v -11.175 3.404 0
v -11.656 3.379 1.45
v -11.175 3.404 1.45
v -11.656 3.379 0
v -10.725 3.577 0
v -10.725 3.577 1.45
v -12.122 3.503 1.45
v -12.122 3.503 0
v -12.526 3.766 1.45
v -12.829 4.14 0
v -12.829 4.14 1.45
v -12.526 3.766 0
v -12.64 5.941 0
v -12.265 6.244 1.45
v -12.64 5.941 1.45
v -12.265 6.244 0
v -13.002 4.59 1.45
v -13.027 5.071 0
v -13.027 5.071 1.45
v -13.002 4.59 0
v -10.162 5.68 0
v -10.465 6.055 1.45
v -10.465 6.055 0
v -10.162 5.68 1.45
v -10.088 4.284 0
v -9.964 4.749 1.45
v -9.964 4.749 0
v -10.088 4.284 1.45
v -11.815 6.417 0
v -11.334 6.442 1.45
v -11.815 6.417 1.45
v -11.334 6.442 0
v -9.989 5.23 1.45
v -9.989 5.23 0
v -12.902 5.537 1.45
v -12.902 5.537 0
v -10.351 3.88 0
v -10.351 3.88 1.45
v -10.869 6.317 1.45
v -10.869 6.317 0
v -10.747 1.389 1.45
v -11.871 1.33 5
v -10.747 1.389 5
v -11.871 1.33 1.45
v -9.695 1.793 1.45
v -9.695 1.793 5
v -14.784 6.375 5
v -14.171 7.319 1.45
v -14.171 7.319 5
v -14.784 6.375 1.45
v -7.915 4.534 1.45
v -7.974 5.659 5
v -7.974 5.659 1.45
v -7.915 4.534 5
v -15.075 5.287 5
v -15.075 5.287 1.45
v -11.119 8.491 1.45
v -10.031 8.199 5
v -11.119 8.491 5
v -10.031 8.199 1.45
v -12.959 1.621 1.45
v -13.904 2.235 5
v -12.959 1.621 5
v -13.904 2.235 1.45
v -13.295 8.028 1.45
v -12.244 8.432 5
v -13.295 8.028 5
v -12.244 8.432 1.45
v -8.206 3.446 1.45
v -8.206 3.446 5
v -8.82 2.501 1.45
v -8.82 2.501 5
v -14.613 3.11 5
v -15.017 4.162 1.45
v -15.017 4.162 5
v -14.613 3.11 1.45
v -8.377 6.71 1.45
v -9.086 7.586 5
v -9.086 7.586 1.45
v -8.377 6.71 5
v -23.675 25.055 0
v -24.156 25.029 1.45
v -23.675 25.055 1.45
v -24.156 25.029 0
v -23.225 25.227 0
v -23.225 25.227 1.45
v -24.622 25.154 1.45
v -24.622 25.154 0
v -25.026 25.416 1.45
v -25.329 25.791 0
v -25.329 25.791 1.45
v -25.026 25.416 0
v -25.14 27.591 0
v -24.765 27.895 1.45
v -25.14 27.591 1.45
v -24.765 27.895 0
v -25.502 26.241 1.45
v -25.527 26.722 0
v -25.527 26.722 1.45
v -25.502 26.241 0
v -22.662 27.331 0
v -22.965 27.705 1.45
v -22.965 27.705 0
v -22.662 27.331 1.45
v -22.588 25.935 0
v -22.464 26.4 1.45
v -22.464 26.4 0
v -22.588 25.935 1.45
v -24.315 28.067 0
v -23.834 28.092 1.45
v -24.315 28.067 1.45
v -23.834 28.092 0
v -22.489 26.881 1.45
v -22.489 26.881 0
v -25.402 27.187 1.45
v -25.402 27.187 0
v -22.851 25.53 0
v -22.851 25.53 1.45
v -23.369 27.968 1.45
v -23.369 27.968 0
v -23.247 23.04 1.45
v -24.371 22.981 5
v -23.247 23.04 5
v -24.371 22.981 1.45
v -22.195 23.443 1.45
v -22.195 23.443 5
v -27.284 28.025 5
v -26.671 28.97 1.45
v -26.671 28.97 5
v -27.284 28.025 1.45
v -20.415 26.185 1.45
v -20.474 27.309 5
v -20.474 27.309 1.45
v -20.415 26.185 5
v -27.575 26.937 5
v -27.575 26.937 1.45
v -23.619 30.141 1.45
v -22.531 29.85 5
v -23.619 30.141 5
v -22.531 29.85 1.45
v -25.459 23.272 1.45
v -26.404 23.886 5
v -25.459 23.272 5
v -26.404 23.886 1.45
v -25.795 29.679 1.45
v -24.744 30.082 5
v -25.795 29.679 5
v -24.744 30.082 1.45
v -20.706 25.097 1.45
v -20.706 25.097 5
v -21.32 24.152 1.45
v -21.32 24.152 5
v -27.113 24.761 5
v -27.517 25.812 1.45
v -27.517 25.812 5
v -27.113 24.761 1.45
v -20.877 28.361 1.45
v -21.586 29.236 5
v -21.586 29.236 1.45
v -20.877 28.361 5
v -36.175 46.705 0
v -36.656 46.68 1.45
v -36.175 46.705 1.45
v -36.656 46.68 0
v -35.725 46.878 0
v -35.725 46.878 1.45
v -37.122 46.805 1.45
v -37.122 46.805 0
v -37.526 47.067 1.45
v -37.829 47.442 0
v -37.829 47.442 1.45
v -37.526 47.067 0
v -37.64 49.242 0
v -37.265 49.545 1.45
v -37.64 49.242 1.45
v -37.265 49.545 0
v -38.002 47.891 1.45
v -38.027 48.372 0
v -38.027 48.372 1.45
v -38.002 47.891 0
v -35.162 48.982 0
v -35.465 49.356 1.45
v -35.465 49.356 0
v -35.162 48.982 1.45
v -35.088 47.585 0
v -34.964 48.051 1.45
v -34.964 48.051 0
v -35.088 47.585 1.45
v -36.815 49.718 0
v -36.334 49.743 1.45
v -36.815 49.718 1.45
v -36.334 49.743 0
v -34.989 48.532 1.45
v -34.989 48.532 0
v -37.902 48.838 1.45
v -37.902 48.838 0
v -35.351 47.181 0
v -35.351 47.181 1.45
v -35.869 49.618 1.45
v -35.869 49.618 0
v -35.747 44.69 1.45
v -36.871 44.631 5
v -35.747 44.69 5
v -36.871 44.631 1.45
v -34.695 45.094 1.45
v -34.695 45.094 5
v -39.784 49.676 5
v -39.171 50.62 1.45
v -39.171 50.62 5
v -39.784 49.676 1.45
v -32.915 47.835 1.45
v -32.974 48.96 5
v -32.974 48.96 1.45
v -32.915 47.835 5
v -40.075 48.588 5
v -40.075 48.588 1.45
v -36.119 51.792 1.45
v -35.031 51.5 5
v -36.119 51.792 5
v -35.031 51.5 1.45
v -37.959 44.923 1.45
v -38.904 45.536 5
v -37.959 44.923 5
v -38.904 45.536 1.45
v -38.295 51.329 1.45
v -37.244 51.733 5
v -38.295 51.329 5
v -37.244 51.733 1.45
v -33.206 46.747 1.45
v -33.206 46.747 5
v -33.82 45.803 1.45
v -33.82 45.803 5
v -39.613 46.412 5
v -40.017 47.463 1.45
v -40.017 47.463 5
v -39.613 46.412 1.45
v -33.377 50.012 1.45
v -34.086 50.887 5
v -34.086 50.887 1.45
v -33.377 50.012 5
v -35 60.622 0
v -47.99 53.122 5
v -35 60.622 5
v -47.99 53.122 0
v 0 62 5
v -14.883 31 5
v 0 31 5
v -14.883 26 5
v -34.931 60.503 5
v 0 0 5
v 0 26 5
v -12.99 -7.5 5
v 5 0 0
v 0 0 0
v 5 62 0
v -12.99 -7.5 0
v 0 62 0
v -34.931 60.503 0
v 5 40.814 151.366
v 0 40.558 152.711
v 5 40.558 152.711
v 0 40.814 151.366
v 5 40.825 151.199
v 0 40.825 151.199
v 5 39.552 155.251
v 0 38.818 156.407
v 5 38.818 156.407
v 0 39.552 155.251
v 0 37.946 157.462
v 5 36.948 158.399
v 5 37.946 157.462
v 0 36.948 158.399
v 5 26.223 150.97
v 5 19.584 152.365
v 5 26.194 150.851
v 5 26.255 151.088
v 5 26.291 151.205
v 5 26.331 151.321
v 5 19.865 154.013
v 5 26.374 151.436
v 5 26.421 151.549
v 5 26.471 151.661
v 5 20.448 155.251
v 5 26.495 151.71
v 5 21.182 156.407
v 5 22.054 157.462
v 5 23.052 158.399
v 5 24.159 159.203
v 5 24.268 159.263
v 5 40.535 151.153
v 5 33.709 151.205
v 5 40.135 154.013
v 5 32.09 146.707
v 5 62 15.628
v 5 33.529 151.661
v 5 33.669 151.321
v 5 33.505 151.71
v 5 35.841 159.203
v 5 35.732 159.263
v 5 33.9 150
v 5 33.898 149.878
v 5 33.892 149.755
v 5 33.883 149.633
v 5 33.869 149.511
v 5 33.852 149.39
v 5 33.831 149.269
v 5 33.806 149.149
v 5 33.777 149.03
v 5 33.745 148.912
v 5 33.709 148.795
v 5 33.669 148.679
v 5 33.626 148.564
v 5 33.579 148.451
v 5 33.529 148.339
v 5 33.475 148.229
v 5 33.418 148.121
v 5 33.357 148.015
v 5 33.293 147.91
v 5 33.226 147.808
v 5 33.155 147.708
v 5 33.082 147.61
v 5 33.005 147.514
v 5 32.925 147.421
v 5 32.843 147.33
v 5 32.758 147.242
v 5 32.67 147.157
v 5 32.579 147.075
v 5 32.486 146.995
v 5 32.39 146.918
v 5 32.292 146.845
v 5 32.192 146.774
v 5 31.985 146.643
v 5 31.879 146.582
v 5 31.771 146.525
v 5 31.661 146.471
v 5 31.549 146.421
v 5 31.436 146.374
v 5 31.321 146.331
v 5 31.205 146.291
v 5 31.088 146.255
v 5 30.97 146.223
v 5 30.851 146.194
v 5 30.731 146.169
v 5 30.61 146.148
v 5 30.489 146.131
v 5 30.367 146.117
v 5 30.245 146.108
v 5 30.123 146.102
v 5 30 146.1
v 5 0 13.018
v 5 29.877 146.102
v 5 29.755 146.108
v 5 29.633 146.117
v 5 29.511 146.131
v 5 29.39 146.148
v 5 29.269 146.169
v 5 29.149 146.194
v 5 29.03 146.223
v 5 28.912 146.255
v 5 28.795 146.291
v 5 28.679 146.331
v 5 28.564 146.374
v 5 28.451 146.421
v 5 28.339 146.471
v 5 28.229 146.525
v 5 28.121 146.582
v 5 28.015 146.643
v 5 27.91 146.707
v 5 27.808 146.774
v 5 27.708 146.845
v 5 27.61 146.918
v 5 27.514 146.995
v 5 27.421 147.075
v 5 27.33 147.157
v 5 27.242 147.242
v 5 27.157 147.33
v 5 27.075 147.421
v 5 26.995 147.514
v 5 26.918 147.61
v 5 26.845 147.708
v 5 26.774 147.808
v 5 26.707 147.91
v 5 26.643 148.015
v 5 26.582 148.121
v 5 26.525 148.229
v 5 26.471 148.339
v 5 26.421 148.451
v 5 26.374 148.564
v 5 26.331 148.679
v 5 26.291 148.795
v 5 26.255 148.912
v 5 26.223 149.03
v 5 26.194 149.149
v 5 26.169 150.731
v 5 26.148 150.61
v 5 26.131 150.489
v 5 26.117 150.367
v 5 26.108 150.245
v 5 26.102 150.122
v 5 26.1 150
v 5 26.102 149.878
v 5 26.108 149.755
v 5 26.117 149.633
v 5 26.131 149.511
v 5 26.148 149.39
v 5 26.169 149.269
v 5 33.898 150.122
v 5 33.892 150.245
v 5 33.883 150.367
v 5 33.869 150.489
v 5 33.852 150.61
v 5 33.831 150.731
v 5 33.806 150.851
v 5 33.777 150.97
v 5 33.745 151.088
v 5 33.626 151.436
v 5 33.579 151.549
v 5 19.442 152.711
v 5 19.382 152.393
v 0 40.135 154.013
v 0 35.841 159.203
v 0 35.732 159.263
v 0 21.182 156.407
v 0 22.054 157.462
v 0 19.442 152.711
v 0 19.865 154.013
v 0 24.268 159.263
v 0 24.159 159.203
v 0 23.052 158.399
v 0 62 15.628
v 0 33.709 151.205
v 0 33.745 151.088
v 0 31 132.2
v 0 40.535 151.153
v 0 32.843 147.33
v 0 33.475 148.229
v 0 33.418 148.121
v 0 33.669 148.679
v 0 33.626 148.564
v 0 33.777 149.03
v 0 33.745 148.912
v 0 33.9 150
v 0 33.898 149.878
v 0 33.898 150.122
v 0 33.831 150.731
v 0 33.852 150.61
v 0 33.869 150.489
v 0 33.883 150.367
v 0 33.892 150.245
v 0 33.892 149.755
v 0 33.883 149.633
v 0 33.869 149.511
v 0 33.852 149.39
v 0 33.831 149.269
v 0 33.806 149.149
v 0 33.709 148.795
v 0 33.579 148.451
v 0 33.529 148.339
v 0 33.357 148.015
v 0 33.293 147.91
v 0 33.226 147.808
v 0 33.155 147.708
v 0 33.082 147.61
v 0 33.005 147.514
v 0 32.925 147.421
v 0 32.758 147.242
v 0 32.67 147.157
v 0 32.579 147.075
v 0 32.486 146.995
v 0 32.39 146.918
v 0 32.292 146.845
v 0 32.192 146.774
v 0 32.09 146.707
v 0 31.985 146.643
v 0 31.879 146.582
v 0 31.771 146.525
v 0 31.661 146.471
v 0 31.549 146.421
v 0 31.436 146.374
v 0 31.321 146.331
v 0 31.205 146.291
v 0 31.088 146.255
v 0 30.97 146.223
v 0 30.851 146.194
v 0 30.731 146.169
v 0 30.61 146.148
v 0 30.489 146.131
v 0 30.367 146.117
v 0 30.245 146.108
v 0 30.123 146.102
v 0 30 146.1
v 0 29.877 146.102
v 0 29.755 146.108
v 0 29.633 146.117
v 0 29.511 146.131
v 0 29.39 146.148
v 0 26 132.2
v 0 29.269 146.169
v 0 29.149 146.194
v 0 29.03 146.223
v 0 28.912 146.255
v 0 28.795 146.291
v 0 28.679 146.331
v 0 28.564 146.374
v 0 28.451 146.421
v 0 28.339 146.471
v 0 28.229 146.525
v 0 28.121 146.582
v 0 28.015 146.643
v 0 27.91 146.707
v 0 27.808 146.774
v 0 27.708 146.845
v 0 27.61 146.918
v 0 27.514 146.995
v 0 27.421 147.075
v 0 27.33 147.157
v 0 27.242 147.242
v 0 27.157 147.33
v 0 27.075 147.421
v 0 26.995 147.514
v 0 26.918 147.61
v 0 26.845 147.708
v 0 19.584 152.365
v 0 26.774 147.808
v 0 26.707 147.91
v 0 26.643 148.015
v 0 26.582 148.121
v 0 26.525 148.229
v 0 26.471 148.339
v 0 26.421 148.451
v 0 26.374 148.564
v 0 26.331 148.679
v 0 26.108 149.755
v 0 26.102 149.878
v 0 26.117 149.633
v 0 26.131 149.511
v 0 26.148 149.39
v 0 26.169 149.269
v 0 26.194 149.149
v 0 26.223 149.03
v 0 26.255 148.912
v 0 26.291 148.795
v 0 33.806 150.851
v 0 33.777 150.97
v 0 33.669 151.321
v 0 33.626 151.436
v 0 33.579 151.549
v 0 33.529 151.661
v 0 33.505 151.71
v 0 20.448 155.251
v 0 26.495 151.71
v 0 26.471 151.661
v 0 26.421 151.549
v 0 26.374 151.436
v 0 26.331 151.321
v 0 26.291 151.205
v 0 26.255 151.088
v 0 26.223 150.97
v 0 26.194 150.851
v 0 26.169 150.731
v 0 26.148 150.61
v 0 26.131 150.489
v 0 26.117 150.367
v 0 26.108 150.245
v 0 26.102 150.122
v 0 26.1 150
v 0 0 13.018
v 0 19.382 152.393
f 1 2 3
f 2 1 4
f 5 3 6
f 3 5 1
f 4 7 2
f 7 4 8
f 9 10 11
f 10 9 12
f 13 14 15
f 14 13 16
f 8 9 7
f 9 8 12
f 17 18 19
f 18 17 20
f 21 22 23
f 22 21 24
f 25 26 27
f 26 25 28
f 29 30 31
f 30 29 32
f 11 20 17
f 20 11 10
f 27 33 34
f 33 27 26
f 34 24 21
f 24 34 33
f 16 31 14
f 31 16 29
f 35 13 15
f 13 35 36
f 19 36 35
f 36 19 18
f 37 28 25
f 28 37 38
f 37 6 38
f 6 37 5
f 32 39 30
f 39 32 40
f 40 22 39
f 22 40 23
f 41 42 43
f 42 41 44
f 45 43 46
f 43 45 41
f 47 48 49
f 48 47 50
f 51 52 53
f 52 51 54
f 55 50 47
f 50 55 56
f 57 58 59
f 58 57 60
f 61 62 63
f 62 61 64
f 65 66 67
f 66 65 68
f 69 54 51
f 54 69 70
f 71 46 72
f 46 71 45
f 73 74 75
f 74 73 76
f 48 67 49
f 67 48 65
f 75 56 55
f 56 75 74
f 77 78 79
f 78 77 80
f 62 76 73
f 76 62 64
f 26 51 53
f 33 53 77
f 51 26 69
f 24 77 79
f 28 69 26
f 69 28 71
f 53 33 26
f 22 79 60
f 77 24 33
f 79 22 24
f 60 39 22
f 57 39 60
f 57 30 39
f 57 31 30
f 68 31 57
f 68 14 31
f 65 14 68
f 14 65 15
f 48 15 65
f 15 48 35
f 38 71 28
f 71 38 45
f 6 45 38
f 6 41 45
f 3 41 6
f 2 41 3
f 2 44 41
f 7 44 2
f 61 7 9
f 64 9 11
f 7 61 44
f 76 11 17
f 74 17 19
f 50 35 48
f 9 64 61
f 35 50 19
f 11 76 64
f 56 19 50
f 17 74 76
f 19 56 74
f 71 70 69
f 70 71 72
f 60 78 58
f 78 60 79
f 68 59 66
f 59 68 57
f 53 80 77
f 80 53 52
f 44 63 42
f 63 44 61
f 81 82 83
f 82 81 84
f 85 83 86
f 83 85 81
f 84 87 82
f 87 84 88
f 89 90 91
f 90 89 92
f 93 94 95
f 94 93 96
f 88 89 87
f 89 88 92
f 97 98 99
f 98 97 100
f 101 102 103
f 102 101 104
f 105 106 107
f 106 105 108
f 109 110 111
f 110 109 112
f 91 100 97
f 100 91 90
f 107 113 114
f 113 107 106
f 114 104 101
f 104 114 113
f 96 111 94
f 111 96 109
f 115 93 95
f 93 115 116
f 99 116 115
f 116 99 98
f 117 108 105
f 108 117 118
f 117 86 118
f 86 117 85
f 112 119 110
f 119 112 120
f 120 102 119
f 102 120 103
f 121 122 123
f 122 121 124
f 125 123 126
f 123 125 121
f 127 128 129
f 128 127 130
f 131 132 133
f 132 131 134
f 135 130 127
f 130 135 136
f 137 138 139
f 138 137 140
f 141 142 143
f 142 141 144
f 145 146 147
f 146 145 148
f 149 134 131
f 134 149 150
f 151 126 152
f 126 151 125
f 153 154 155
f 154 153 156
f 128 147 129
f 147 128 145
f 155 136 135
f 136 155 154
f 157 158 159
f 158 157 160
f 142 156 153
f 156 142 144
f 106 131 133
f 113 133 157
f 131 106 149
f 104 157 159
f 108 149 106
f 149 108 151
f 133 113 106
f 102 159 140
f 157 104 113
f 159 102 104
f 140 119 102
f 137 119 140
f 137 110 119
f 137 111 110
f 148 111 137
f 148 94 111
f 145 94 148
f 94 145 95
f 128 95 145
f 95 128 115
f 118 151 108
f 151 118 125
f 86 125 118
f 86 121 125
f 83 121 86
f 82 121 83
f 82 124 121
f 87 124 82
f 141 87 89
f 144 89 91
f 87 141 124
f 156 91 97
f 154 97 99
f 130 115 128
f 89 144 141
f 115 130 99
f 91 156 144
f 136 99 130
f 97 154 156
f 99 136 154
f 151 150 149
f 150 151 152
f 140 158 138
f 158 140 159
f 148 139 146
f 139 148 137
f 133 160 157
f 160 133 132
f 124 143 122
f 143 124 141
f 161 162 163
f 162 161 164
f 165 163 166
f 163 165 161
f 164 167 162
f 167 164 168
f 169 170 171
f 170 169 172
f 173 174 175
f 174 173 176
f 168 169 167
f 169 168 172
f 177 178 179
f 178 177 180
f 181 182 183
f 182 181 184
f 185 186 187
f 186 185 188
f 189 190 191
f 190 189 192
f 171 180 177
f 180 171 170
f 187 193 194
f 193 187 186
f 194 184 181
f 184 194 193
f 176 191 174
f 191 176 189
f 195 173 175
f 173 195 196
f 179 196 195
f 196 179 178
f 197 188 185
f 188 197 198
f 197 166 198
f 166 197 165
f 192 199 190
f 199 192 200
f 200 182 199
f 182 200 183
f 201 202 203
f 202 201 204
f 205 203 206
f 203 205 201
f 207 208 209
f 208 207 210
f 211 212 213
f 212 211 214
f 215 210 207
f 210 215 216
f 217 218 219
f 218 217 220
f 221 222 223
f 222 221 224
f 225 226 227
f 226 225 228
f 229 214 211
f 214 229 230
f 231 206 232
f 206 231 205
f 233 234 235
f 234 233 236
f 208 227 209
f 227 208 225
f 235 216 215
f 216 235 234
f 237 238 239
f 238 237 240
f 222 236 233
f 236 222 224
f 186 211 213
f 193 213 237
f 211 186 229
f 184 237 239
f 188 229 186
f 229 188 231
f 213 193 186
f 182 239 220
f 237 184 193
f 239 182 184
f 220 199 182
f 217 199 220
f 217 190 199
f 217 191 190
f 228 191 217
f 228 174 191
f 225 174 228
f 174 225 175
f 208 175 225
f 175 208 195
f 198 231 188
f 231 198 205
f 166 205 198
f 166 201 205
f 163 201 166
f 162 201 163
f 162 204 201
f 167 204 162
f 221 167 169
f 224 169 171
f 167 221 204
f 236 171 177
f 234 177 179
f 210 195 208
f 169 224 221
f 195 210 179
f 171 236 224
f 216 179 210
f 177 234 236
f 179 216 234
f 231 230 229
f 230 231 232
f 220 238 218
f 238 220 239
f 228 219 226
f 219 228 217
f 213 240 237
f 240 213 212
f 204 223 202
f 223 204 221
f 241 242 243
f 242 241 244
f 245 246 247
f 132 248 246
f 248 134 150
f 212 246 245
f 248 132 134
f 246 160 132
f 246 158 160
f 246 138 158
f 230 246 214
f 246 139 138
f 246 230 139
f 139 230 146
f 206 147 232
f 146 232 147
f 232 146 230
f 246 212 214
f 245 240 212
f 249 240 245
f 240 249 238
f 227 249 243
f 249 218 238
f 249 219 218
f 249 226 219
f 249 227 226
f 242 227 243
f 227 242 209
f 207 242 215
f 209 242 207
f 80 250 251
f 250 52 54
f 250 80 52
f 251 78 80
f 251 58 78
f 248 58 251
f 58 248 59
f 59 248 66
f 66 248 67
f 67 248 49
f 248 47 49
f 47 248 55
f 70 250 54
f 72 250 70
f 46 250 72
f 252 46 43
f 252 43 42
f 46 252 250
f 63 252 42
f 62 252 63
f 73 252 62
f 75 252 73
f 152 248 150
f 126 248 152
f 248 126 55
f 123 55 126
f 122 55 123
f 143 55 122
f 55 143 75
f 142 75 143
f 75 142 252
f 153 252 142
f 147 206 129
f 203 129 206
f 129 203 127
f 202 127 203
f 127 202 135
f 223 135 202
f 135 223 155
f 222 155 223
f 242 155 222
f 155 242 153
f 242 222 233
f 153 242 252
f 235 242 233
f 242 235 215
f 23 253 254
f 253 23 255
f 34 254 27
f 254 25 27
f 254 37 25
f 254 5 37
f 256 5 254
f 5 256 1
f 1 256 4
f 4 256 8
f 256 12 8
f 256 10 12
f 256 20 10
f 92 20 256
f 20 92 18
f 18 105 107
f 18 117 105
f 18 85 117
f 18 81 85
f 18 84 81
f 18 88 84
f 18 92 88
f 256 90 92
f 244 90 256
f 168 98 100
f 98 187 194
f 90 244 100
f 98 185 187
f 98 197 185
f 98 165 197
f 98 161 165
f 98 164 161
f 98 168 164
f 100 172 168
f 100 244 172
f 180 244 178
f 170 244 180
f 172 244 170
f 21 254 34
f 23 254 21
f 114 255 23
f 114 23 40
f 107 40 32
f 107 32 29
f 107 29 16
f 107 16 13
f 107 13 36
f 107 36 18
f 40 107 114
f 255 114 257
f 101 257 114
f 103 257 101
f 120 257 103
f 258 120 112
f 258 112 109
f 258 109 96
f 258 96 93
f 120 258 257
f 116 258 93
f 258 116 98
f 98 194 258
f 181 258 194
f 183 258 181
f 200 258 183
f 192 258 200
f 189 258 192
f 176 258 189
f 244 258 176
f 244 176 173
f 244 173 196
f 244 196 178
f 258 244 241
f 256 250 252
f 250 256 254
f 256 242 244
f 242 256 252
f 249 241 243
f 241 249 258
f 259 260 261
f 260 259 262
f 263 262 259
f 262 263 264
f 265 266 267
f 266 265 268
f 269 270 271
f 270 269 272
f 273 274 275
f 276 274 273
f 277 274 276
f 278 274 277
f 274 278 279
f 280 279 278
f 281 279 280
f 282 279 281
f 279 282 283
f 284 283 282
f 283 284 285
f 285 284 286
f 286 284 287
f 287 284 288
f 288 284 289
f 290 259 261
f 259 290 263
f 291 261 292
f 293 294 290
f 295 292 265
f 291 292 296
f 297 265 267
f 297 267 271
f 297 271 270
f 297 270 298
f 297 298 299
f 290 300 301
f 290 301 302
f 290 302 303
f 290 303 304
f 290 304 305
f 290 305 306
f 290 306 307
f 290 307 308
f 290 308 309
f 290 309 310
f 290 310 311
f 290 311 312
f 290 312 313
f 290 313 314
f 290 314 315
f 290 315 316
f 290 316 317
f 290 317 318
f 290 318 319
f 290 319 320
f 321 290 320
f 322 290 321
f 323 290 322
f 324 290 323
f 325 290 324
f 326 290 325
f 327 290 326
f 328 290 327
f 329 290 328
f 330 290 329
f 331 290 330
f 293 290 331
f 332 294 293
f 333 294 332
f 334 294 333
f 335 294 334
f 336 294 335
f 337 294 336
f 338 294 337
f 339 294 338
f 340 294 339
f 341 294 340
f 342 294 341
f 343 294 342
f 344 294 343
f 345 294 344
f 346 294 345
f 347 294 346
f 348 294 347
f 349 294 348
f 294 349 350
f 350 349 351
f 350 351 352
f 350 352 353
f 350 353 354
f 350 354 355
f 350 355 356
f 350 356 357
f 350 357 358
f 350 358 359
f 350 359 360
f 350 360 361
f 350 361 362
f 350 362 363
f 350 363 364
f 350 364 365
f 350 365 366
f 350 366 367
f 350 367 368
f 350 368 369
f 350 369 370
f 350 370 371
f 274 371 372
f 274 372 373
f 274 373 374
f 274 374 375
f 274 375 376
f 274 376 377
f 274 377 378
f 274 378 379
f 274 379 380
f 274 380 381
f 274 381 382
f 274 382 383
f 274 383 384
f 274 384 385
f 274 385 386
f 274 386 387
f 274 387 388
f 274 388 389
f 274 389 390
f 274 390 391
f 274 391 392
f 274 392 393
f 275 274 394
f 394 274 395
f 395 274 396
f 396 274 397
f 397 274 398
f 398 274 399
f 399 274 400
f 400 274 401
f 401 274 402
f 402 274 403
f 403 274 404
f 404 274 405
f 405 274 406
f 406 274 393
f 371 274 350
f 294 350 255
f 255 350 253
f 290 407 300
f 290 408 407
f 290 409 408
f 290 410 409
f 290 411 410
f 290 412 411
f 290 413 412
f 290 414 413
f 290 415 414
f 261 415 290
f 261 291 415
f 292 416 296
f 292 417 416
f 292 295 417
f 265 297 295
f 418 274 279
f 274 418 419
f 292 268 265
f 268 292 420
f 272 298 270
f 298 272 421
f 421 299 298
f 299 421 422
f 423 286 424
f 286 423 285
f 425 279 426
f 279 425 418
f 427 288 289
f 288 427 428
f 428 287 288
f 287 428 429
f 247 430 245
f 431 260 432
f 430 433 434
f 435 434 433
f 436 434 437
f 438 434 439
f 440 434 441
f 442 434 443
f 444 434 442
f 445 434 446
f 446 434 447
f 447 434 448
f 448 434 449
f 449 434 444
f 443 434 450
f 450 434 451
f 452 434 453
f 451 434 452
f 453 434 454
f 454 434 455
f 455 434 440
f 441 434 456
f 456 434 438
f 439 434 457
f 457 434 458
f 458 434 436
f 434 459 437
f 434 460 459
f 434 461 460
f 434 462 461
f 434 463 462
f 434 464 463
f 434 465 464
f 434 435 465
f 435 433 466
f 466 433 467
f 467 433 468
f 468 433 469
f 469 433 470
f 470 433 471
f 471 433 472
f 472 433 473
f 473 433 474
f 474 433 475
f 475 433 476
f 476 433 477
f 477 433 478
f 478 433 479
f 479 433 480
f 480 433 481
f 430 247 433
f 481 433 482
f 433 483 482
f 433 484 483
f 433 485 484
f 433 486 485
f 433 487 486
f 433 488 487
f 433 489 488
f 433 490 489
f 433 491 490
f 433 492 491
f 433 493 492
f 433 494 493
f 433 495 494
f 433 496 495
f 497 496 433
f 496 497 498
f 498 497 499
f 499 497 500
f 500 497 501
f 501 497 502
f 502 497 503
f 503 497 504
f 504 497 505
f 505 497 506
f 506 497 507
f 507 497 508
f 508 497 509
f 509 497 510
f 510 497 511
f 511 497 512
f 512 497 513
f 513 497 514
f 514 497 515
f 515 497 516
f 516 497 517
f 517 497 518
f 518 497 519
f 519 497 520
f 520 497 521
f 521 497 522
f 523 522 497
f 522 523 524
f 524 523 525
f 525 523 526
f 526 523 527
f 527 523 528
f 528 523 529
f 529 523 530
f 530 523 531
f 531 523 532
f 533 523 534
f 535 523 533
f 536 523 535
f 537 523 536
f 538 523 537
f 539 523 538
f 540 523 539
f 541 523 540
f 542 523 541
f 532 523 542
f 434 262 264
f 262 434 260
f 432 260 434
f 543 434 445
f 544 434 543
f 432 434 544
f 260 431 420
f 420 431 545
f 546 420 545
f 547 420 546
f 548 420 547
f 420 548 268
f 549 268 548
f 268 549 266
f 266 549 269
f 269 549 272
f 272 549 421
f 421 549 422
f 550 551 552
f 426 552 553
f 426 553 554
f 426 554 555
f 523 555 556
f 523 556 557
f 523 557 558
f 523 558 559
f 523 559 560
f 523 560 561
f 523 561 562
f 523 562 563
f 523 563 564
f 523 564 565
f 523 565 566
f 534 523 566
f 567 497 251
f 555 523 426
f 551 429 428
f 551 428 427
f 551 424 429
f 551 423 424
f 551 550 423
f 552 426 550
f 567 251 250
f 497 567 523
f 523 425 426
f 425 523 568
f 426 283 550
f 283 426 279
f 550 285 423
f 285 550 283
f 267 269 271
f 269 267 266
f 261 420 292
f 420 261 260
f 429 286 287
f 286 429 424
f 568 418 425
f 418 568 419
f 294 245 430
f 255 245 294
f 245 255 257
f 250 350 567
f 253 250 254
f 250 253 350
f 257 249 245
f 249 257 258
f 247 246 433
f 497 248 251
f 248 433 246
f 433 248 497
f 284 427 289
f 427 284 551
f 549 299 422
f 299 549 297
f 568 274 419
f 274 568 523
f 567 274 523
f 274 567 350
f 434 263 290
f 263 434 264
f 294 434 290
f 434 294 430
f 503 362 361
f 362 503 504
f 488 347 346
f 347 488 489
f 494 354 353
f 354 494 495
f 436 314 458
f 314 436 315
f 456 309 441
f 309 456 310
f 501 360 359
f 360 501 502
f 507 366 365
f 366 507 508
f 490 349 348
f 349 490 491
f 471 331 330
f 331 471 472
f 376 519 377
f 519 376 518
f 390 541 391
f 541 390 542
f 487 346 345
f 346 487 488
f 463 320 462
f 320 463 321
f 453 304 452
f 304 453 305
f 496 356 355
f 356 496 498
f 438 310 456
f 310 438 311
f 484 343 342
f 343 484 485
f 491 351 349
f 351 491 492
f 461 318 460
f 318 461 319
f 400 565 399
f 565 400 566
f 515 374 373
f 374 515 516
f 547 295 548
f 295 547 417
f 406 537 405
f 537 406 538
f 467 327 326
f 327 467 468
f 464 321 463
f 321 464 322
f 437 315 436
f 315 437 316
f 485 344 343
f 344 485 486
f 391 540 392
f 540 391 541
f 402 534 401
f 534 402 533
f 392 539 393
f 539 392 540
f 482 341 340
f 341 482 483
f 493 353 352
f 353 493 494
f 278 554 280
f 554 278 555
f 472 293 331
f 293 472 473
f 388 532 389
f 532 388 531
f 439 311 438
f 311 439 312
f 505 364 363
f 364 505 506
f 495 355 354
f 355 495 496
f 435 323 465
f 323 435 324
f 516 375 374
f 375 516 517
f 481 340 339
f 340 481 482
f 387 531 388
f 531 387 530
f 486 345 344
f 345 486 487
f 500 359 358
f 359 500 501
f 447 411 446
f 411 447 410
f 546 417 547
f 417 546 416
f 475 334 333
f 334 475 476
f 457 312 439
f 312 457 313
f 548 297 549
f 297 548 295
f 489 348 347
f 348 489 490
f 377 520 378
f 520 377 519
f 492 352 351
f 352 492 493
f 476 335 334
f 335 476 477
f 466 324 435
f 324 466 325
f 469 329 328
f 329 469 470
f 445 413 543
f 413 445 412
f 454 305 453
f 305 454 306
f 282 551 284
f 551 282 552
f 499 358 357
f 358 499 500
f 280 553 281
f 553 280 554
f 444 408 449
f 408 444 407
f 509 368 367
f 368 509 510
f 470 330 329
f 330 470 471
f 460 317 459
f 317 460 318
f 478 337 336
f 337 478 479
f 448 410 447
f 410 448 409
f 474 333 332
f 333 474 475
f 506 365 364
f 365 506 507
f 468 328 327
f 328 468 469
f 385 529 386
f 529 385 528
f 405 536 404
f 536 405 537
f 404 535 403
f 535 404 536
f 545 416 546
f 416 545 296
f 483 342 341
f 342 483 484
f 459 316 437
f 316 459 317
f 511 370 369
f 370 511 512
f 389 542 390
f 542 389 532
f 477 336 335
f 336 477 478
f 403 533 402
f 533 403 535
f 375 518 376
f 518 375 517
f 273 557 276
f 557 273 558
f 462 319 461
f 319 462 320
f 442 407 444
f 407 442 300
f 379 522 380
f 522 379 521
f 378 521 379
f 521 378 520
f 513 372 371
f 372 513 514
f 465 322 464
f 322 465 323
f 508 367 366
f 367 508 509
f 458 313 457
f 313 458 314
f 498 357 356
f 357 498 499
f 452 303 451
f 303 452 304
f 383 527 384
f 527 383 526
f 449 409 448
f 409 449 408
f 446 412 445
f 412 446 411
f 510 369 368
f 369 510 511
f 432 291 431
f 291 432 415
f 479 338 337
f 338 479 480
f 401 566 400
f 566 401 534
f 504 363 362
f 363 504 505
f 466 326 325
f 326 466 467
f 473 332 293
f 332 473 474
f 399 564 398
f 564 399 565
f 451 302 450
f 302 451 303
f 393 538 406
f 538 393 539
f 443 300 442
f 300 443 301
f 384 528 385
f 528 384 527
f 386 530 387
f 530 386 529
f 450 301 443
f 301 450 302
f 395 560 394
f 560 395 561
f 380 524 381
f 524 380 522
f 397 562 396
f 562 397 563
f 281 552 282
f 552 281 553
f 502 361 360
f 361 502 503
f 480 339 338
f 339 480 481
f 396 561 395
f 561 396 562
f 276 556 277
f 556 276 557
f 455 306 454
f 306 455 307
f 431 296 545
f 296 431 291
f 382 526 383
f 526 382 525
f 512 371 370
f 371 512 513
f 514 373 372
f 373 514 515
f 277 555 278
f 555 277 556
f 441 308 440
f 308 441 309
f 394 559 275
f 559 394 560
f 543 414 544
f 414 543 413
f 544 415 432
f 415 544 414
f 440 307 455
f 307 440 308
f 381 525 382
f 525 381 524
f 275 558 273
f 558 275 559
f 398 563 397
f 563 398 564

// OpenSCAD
// file: configuration.scad
// Increase this if your slicer or printer make holes too tight.
extra_radius = 0.1;

// OD = outside diameter, corner to corner.
m3_nut_od = 6.1;
m3_nut_radius = m3_nut_od/2 + 0.2 + extra_radius;
m3_washer_radius = 3.5 + extra_radius;
m3_washer_height = 0.65;

// Major diameter of metric 3mm thread.
m3_head_height = 3;
m3_major = 2.88;
m3_radius = m3_major/2 + extra_radius;
m3_wide_radius = m3_major/2 + extra_radius + 0.2;

// NEMA17 stepper motors.
motor_shaft_diameter = 5;
motor_shaft_radius = motor_shaft_diameter/2 + extra_radius;

// Frame brackets. M3x8mm screws work best with 3.6 mm brackets.
thickness = 3.6;

// OpenBeam or Misumi. Currently only 15x15 mm, but there is a plan
// to make models more parametric and allow 20x20 mm in the future.
extrusion = 15;

// Placement for the NEMA17 stepper motors.
motor_offset = 44;
motor_length = 47;

// M3 screw hole with loose insertion to be used with a nut.
module M3Screw(length=10)
{
	union()
	{
		// Main shaft
		translate([0, 0, m3_head_height])
		cylinder(r=m3_radius, h=length, $fn=20);
		// Head
		cylinder(r=m3_washer_radius, h=m3_head_height+m3_washer_height, $fn=20);
	}
}

// M3 screw with exact dimensions intended for screwing directly into plastic.
module M3ExactScrew(length=10)
{
	union()
	{
		// Main shaft
		translate([0, 0, m3_head_height])
		cylinder(r=m3_radius - extra_radius, h=length, $fn=20);
		// Head
		cylinder(r=m3_washer_radius, h=m3_head_height+m3_washer_height, $fn=20);
	}
}
// main file
include <configuration.scad>;

bearing_od = 21.8;
tube_length = 110;
tube_wall_thickness = 3;
end_ring_diameter = 37;
end_ring_thickness = 4;
rod_extension_length = 25;
rod_diameter = 7.8;
stand_height = 150.0;
stand_base_thickness = 5;
stand_base_length = 70;

module standBase() {
	difference()
	{
		cube([stand_base_length, extrusion, stand_base_thickness]);

		for(x=[10:(stand_base_length-20)/2:stand_base_length-10]) {
			translate([x, extrusion/2, stand_base_thickness+0.1])
			rotate([0, 180, 0])
				#M3Screw(stand_base_thickness + 3);	
		}
	}
}

module rightStand() {
	difference()
	{
		union()
		{
			rotate([0, 0, 120])
				standBase();
			// Top attachment point
			translate([0, stand_base_length/2-5, stand_height])
			rotate([90, 0, 90])
				cylinder(r=bearing_od/2, h=stand_base_thickness,$fn=50);
			// main cube
			translate([0, 0, 0])
				cube([stand_base_thickness, stand_base_length-8, stand_height]);
			// bottom fill
			linear_extrude(height=stand_base_thickness)
				polygon(points=[[0,0],[0,stand_base_length-8],[-35,stand_base_length-9.5],]);
			// large support triangle
			translate([-15, 31, stand_base_thickness-1])
			rotate([90, 0, 0])
			linear_extrude(height=stand_base_thickness)
				polygon(points=[[0,0],[15,0],[15,stand_height-bearing_od],]);
		}


		// Remove right triangle
		translate([0, -31, 8])
		rotate([-8])
			#cube([10, 30, stand_height]);

		// Remove left triangle
		translate([0, 64, 3])
		rotate([9])
			cube([10, 30, stand_height]);

		// Remove hole for spool rod.
		translate([-25, stand_base_length/2-5, stand_height])
		rotate([0, 90, 0])
			#rod();

		// Remove notch for rod to slip into.
		// Hack: the height of linear_extrude doesn't seem to work in the difference().  Using the loop to duplicate the default thickness...
		for(x=[0:2:6]) {	
			translate([0+x, stand_base_length/2-5, stand_height])
			rotate([0,-90,0])
			linear_extrude(height=20)
				#polygon(points=[[0,3],[0,-3],[20,-rod_diameter/2-5],[20,rod_diameter/2+5],]);
		}
	}
}


module leftStand() {
	difference()
	{
		union()
		{
			rotate([0, 0, 60])
				standBase();
			// Top attachment point
			translate([30, stand_base_length/2-5, stand_height])
			rotate([90, 0, 90])
				cylinder(r=bearing_od/2, h=stand_base_thickness,$fn=50);
			// main cube
			translate([30, 0, 0])
				cube([stand_base_thickness, stand_base_length-8, stand_height]);
			// bottom fill
			linear_extrude(height=stand_base_thickness)
				polygon(points=[[0,0],[30,0],[30,stand_base_length-8],]);
			// large support triangle
			translate([15, 31, stand_base_thickness-1])
			rotate([90, 0, 0])
			linear_extrude(height=stand_base_thickness)
				polygon(points=[[0,0],[15,0],[15,stand_height-bearing_od],]);
		}


		// Remove right triangle
		translate([30, -31, 8])
		rotate([-8])
			cube([10, 30, stand_height]);

		// Remove left triangle
		translate([30, 64, 3])
		rotate([9])
			cube([10, 30, stand_height]);

		// Remove hole for spool rod.
		translate([25, stand_base_length/2-5, stand_height])
		rotate([0, 90, 0])
			#rod();

		// Remove notch for rod to slip into.
		// Hack: the height of linear_extrude doesn't seem to work in the difference().  Using the loop to duplicate the default thickness...
		for(x=[0:2:6]) {	
			translate([30+x, stand_base_length/2-5, stand_height])
			rotate([0,-90,0])
			linear_extrude(height=20)
				#polygon(points=[[0,3],[0,-3],[20,-rod_diameter/2-5],[20,rod_diameter/2+5],]);
		}
	}
}

module endCone() {
	cylinder(h=end_ring_thickness, r1 = end_ring_diameter/2, r2=bearing_od/2 + tube_wall_thickness, $fn = 200);
};

module spool() {
	difference() {
		union() {
			cylinder(h=tube_length, r=bearing_od/2 + tube_wall_thickness, $fn=200);
			translate([0, 0, -end_ring_thickness])
				endCone();
			translate([0, 0, tube_length + end_ring_thickness])
			rotate([180, 0, 0])
				endCone();
		}

		// Hollow out the tube.
		translate([0, 0, -end_ring_thickness-1])
			cylinder(h=tube_length + end_ring_thickness*2 + 2, r=bearing_od/2, $fn=200);
		
		// Take away the sharp edge on the end rings.
		translate([0, 0, -end_ring_thickness -1])
		difference() {		
			cylinder(h=tube_length + end_ring_thickness * 2 + 2, r=end_ring_diameter/2, $fn=200);
			translate([0, 0, -1])
				cylinder(h=tube_length + end_ring_thickness*2 + 2, r=end_ring_diameter/2 - 3, $fn=200);
		}
	};
};

module rod() {
	cylinder (h=tube_length + rod_extension_length*2, r=rod_diameter/2, $fn=200);
};

module mount() {
	//polyhedron(points=[[
};

module completeAssembly() {
	spool();
	translate([0, 0, -end_ring_thickness-rod_extension_length])
	#rod();
};

//completeAssembly();
//spool();
rightStand();
